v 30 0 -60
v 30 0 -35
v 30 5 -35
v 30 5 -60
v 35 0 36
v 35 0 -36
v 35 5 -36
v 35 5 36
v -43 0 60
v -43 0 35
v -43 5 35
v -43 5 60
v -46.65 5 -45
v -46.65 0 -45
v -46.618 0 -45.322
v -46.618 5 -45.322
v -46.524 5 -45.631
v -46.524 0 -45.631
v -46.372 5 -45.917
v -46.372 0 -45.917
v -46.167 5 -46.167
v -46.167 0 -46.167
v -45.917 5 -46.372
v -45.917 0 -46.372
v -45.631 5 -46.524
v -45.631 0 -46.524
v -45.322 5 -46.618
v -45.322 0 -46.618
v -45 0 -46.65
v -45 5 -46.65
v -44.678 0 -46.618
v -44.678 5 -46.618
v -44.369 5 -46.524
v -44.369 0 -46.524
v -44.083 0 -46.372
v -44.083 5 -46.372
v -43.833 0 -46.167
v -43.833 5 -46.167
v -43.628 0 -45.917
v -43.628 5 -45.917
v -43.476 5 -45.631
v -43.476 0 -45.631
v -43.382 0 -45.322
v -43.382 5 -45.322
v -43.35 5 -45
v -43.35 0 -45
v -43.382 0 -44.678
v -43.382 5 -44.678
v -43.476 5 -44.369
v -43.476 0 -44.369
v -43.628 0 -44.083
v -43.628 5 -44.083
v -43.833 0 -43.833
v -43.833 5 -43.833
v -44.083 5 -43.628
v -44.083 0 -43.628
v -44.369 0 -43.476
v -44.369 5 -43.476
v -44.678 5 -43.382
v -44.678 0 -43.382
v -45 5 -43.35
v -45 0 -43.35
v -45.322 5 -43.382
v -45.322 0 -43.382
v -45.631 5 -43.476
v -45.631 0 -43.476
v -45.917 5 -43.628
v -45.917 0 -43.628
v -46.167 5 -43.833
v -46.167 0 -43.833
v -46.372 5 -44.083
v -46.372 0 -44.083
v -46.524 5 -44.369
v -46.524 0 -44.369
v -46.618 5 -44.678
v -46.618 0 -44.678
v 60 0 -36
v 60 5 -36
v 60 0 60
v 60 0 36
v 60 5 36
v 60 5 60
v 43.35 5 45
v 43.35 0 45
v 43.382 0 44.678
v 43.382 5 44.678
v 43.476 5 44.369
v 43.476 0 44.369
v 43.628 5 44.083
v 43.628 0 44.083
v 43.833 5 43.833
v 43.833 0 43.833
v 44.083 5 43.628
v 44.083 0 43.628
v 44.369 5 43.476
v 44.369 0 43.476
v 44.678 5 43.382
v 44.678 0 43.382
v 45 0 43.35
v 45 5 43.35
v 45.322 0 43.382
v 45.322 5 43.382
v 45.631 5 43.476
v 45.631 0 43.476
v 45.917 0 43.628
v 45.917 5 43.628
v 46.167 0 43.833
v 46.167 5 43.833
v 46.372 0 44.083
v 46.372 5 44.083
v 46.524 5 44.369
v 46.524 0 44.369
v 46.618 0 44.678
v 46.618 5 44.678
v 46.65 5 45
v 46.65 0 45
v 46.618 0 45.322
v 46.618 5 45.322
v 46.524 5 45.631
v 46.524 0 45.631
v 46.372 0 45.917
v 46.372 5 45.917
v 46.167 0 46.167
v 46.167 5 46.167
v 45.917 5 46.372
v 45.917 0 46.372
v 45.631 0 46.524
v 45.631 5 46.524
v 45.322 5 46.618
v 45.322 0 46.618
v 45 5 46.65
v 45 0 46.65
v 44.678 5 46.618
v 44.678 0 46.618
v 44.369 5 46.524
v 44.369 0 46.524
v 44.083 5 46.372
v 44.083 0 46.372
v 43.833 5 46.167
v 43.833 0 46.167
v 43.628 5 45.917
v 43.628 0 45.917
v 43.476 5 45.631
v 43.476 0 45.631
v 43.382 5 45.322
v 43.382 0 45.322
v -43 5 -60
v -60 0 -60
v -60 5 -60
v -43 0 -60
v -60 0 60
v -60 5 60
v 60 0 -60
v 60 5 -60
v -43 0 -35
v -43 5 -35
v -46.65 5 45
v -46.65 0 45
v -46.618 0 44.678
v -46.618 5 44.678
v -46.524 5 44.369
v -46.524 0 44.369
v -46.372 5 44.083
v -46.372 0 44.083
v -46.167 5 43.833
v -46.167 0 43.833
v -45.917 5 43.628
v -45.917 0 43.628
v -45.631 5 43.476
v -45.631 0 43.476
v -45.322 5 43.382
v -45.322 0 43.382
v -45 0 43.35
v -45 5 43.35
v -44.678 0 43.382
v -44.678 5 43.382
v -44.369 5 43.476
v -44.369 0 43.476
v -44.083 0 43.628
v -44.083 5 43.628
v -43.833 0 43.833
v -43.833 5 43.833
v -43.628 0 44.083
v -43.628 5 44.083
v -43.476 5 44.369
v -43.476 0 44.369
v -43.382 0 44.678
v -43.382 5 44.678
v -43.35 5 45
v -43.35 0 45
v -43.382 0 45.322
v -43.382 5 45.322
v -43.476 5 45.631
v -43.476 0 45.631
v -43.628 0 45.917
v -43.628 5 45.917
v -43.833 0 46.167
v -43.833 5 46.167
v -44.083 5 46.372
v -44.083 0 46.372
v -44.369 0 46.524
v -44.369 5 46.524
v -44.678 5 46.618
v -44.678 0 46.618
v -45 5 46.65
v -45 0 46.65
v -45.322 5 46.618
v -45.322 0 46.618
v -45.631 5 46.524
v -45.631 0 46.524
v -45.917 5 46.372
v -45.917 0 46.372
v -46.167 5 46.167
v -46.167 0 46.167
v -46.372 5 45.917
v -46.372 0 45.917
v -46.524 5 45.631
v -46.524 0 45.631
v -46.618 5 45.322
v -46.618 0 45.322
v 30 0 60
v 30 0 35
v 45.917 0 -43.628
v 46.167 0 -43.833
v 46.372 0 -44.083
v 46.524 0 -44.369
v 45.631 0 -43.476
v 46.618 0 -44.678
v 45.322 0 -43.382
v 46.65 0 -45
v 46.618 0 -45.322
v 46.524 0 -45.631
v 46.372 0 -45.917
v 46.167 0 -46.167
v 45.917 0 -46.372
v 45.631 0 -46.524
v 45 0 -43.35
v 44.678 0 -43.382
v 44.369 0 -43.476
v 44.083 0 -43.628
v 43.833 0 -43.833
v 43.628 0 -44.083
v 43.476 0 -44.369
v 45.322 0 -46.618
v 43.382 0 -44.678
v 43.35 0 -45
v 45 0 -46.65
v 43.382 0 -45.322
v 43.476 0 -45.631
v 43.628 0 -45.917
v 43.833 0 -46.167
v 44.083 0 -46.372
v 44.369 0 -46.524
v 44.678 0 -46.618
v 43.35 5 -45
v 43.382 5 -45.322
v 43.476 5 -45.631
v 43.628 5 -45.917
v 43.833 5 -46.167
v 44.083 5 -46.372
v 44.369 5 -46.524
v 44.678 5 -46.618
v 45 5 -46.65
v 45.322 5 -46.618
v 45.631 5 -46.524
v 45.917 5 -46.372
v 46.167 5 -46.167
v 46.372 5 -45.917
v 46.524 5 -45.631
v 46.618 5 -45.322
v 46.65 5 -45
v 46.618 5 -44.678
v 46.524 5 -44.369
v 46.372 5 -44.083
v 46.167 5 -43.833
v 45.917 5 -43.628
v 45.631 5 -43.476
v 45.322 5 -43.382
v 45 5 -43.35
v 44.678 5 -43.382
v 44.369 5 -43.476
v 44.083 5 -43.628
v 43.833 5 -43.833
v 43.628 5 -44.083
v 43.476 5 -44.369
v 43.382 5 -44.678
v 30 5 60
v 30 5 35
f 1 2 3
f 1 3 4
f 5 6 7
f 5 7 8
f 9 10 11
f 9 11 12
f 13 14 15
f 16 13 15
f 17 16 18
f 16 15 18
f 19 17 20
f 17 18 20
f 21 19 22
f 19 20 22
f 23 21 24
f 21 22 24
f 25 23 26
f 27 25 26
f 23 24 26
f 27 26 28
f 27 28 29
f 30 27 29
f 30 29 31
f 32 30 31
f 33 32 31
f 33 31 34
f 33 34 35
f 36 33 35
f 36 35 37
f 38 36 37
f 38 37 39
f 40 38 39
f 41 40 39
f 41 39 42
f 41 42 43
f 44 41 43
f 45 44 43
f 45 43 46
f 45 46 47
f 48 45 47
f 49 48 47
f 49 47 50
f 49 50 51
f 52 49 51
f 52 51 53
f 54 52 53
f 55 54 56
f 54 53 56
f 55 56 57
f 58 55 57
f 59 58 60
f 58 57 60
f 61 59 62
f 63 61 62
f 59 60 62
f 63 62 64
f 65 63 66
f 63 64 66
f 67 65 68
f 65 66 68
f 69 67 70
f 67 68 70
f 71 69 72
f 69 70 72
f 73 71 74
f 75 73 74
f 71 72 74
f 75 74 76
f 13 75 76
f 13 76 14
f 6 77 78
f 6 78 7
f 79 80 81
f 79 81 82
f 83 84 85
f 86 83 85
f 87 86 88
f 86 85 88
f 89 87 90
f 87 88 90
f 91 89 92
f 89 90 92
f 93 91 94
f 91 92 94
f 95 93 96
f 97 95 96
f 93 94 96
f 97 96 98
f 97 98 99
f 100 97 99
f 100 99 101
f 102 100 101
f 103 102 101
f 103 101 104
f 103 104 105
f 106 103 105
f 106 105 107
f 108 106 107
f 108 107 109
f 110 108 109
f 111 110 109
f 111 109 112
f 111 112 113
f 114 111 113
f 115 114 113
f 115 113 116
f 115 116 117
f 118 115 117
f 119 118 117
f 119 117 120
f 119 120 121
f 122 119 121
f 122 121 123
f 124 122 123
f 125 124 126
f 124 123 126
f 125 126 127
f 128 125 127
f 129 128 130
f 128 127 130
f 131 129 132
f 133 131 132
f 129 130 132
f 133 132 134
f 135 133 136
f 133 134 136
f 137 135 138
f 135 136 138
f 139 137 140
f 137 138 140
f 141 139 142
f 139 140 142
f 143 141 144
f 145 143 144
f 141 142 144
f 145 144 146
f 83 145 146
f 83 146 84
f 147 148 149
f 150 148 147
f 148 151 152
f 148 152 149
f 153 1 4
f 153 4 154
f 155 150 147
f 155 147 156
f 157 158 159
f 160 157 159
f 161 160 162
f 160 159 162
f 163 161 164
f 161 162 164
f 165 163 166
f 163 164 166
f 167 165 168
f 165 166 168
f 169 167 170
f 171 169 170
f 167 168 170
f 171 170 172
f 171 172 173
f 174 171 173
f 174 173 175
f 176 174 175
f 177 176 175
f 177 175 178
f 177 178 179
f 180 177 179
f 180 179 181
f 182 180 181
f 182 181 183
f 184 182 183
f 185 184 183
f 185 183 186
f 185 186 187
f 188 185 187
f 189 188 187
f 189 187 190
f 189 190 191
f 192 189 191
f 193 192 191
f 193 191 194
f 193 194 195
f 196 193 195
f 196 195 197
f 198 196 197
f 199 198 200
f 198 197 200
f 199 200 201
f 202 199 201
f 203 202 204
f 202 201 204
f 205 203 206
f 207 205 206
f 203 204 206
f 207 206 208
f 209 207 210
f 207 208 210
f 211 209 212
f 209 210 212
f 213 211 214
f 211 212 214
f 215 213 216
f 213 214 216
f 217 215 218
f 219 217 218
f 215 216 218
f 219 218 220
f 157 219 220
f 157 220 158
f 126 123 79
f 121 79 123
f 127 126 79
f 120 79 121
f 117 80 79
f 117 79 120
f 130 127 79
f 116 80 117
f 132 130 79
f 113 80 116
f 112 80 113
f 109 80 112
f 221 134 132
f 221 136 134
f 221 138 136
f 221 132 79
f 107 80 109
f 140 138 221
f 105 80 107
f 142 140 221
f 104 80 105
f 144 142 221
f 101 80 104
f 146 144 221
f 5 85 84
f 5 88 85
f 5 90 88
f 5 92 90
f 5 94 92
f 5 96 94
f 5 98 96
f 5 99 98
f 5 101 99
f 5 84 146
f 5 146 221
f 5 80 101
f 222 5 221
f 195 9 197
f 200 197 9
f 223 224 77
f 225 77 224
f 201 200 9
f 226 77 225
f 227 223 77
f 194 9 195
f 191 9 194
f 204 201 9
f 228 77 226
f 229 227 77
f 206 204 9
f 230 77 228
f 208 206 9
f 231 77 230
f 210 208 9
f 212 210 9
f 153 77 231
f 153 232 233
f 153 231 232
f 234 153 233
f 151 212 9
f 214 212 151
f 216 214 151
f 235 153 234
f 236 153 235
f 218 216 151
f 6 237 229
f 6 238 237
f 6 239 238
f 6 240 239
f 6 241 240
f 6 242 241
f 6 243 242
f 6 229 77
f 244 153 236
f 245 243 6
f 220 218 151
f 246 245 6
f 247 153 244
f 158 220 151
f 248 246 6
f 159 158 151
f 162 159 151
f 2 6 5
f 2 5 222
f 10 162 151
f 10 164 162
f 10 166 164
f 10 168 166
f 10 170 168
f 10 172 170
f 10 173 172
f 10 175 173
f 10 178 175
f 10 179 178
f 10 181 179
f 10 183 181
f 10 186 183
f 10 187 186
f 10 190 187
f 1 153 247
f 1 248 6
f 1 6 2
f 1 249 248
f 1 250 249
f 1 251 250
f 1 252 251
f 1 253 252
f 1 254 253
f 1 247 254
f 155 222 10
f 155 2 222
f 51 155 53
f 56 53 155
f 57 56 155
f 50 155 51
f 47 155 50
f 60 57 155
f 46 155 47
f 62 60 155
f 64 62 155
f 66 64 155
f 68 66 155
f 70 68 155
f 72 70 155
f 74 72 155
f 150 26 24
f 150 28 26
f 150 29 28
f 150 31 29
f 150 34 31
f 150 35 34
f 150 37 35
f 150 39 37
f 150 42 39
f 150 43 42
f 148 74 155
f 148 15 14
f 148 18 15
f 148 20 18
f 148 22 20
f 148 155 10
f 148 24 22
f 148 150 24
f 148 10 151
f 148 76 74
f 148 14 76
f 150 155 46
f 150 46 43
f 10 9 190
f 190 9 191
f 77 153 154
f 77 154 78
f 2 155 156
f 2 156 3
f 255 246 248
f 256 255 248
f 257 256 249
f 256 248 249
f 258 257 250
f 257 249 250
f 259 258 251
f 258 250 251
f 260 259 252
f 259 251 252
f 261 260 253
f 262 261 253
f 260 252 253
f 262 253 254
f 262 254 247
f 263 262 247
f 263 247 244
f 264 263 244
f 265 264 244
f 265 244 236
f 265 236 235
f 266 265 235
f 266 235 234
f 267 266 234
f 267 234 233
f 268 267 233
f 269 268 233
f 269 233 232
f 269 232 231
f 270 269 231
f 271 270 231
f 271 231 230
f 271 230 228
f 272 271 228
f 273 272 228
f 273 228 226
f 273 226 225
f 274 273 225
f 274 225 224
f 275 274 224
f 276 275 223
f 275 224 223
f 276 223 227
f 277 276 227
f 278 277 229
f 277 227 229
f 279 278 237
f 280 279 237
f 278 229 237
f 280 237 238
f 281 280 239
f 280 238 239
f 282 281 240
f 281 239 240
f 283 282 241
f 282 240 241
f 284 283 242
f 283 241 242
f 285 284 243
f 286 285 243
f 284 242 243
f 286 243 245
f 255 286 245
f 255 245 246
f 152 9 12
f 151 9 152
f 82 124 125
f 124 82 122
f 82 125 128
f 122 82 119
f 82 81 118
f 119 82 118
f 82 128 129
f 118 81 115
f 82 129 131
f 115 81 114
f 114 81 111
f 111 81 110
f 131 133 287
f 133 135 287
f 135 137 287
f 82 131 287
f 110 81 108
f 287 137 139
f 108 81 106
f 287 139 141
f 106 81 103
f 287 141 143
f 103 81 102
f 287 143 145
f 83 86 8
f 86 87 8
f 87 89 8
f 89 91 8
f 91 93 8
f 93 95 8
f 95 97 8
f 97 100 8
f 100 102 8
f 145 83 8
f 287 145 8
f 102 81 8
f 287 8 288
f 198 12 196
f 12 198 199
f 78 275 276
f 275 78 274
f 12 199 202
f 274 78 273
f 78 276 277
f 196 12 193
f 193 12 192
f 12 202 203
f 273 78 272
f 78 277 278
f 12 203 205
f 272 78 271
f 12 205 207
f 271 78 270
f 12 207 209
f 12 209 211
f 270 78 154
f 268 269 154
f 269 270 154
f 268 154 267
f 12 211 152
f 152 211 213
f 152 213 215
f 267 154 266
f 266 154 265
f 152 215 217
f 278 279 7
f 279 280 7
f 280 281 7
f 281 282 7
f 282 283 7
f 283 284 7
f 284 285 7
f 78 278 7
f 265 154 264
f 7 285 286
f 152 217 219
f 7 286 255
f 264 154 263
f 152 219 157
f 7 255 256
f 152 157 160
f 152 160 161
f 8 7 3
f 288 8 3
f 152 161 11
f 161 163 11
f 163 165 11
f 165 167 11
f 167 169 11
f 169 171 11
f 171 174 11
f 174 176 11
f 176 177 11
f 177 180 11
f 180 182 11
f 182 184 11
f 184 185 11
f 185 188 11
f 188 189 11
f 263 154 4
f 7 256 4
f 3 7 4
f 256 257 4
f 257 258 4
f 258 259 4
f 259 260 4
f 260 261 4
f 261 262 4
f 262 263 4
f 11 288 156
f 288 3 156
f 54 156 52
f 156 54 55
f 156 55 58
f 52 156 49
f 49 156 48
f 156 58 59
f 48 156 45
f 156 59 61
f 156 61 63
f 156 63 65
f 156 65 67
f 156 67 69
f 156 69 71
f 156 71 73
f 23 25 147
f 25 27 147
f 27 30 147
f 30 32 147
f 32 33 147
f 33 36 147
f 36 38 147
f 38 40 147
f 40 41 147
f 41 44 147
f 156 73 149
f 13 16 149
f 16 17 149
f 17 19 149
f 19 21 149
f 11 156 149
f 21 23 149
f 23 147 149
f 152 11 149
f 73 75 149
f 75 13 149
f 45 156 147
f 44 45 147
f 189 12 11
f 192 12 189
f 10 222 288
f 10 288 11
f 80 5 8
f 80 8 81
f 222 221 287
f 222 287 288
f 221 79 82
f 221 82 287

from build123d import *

# Parameters (mm, degrees)
BOSS_EXTRUDE1_DEPTH        = 5
F_3_3_3_3_DIAMETER_HOLE1_D = 3.3


with BuildPart() as part:
    # Sketch1 → Boss-Extrude1 (new body)
    with BuildSketch(Plane(origin=(0, 0, 0), x_dir=(1, 0, 0), z_dir=(0, 1, 0))):
        Polygon((-43, 60), (-43, 35), (30, 35), (30, 60), (60, 60), (60, 36), (35, 36), (35, -36), (60, -36), (60, -60), (30, -60), (30, -35), (-43, -35), (-43, -60), (-60, -60), (-60, 60), align=None)
    extrude(amount=BOSS_EXTRUDE1_DEPTH)

    # Ø3.3 (3.3) Diameter Hole1 (through all)
    with Locations(Plane(origin=(0, 5, 0), x_dir=(1, 0, 0), z_dir=(0, 1, 0))):
        with Locations((-45, 45), (45, 45), (45, -45), (-45, -45)):
            Hole(F_3_3_3_3_DIAMETER_HOLE1_D / 2)


solid = part.part
